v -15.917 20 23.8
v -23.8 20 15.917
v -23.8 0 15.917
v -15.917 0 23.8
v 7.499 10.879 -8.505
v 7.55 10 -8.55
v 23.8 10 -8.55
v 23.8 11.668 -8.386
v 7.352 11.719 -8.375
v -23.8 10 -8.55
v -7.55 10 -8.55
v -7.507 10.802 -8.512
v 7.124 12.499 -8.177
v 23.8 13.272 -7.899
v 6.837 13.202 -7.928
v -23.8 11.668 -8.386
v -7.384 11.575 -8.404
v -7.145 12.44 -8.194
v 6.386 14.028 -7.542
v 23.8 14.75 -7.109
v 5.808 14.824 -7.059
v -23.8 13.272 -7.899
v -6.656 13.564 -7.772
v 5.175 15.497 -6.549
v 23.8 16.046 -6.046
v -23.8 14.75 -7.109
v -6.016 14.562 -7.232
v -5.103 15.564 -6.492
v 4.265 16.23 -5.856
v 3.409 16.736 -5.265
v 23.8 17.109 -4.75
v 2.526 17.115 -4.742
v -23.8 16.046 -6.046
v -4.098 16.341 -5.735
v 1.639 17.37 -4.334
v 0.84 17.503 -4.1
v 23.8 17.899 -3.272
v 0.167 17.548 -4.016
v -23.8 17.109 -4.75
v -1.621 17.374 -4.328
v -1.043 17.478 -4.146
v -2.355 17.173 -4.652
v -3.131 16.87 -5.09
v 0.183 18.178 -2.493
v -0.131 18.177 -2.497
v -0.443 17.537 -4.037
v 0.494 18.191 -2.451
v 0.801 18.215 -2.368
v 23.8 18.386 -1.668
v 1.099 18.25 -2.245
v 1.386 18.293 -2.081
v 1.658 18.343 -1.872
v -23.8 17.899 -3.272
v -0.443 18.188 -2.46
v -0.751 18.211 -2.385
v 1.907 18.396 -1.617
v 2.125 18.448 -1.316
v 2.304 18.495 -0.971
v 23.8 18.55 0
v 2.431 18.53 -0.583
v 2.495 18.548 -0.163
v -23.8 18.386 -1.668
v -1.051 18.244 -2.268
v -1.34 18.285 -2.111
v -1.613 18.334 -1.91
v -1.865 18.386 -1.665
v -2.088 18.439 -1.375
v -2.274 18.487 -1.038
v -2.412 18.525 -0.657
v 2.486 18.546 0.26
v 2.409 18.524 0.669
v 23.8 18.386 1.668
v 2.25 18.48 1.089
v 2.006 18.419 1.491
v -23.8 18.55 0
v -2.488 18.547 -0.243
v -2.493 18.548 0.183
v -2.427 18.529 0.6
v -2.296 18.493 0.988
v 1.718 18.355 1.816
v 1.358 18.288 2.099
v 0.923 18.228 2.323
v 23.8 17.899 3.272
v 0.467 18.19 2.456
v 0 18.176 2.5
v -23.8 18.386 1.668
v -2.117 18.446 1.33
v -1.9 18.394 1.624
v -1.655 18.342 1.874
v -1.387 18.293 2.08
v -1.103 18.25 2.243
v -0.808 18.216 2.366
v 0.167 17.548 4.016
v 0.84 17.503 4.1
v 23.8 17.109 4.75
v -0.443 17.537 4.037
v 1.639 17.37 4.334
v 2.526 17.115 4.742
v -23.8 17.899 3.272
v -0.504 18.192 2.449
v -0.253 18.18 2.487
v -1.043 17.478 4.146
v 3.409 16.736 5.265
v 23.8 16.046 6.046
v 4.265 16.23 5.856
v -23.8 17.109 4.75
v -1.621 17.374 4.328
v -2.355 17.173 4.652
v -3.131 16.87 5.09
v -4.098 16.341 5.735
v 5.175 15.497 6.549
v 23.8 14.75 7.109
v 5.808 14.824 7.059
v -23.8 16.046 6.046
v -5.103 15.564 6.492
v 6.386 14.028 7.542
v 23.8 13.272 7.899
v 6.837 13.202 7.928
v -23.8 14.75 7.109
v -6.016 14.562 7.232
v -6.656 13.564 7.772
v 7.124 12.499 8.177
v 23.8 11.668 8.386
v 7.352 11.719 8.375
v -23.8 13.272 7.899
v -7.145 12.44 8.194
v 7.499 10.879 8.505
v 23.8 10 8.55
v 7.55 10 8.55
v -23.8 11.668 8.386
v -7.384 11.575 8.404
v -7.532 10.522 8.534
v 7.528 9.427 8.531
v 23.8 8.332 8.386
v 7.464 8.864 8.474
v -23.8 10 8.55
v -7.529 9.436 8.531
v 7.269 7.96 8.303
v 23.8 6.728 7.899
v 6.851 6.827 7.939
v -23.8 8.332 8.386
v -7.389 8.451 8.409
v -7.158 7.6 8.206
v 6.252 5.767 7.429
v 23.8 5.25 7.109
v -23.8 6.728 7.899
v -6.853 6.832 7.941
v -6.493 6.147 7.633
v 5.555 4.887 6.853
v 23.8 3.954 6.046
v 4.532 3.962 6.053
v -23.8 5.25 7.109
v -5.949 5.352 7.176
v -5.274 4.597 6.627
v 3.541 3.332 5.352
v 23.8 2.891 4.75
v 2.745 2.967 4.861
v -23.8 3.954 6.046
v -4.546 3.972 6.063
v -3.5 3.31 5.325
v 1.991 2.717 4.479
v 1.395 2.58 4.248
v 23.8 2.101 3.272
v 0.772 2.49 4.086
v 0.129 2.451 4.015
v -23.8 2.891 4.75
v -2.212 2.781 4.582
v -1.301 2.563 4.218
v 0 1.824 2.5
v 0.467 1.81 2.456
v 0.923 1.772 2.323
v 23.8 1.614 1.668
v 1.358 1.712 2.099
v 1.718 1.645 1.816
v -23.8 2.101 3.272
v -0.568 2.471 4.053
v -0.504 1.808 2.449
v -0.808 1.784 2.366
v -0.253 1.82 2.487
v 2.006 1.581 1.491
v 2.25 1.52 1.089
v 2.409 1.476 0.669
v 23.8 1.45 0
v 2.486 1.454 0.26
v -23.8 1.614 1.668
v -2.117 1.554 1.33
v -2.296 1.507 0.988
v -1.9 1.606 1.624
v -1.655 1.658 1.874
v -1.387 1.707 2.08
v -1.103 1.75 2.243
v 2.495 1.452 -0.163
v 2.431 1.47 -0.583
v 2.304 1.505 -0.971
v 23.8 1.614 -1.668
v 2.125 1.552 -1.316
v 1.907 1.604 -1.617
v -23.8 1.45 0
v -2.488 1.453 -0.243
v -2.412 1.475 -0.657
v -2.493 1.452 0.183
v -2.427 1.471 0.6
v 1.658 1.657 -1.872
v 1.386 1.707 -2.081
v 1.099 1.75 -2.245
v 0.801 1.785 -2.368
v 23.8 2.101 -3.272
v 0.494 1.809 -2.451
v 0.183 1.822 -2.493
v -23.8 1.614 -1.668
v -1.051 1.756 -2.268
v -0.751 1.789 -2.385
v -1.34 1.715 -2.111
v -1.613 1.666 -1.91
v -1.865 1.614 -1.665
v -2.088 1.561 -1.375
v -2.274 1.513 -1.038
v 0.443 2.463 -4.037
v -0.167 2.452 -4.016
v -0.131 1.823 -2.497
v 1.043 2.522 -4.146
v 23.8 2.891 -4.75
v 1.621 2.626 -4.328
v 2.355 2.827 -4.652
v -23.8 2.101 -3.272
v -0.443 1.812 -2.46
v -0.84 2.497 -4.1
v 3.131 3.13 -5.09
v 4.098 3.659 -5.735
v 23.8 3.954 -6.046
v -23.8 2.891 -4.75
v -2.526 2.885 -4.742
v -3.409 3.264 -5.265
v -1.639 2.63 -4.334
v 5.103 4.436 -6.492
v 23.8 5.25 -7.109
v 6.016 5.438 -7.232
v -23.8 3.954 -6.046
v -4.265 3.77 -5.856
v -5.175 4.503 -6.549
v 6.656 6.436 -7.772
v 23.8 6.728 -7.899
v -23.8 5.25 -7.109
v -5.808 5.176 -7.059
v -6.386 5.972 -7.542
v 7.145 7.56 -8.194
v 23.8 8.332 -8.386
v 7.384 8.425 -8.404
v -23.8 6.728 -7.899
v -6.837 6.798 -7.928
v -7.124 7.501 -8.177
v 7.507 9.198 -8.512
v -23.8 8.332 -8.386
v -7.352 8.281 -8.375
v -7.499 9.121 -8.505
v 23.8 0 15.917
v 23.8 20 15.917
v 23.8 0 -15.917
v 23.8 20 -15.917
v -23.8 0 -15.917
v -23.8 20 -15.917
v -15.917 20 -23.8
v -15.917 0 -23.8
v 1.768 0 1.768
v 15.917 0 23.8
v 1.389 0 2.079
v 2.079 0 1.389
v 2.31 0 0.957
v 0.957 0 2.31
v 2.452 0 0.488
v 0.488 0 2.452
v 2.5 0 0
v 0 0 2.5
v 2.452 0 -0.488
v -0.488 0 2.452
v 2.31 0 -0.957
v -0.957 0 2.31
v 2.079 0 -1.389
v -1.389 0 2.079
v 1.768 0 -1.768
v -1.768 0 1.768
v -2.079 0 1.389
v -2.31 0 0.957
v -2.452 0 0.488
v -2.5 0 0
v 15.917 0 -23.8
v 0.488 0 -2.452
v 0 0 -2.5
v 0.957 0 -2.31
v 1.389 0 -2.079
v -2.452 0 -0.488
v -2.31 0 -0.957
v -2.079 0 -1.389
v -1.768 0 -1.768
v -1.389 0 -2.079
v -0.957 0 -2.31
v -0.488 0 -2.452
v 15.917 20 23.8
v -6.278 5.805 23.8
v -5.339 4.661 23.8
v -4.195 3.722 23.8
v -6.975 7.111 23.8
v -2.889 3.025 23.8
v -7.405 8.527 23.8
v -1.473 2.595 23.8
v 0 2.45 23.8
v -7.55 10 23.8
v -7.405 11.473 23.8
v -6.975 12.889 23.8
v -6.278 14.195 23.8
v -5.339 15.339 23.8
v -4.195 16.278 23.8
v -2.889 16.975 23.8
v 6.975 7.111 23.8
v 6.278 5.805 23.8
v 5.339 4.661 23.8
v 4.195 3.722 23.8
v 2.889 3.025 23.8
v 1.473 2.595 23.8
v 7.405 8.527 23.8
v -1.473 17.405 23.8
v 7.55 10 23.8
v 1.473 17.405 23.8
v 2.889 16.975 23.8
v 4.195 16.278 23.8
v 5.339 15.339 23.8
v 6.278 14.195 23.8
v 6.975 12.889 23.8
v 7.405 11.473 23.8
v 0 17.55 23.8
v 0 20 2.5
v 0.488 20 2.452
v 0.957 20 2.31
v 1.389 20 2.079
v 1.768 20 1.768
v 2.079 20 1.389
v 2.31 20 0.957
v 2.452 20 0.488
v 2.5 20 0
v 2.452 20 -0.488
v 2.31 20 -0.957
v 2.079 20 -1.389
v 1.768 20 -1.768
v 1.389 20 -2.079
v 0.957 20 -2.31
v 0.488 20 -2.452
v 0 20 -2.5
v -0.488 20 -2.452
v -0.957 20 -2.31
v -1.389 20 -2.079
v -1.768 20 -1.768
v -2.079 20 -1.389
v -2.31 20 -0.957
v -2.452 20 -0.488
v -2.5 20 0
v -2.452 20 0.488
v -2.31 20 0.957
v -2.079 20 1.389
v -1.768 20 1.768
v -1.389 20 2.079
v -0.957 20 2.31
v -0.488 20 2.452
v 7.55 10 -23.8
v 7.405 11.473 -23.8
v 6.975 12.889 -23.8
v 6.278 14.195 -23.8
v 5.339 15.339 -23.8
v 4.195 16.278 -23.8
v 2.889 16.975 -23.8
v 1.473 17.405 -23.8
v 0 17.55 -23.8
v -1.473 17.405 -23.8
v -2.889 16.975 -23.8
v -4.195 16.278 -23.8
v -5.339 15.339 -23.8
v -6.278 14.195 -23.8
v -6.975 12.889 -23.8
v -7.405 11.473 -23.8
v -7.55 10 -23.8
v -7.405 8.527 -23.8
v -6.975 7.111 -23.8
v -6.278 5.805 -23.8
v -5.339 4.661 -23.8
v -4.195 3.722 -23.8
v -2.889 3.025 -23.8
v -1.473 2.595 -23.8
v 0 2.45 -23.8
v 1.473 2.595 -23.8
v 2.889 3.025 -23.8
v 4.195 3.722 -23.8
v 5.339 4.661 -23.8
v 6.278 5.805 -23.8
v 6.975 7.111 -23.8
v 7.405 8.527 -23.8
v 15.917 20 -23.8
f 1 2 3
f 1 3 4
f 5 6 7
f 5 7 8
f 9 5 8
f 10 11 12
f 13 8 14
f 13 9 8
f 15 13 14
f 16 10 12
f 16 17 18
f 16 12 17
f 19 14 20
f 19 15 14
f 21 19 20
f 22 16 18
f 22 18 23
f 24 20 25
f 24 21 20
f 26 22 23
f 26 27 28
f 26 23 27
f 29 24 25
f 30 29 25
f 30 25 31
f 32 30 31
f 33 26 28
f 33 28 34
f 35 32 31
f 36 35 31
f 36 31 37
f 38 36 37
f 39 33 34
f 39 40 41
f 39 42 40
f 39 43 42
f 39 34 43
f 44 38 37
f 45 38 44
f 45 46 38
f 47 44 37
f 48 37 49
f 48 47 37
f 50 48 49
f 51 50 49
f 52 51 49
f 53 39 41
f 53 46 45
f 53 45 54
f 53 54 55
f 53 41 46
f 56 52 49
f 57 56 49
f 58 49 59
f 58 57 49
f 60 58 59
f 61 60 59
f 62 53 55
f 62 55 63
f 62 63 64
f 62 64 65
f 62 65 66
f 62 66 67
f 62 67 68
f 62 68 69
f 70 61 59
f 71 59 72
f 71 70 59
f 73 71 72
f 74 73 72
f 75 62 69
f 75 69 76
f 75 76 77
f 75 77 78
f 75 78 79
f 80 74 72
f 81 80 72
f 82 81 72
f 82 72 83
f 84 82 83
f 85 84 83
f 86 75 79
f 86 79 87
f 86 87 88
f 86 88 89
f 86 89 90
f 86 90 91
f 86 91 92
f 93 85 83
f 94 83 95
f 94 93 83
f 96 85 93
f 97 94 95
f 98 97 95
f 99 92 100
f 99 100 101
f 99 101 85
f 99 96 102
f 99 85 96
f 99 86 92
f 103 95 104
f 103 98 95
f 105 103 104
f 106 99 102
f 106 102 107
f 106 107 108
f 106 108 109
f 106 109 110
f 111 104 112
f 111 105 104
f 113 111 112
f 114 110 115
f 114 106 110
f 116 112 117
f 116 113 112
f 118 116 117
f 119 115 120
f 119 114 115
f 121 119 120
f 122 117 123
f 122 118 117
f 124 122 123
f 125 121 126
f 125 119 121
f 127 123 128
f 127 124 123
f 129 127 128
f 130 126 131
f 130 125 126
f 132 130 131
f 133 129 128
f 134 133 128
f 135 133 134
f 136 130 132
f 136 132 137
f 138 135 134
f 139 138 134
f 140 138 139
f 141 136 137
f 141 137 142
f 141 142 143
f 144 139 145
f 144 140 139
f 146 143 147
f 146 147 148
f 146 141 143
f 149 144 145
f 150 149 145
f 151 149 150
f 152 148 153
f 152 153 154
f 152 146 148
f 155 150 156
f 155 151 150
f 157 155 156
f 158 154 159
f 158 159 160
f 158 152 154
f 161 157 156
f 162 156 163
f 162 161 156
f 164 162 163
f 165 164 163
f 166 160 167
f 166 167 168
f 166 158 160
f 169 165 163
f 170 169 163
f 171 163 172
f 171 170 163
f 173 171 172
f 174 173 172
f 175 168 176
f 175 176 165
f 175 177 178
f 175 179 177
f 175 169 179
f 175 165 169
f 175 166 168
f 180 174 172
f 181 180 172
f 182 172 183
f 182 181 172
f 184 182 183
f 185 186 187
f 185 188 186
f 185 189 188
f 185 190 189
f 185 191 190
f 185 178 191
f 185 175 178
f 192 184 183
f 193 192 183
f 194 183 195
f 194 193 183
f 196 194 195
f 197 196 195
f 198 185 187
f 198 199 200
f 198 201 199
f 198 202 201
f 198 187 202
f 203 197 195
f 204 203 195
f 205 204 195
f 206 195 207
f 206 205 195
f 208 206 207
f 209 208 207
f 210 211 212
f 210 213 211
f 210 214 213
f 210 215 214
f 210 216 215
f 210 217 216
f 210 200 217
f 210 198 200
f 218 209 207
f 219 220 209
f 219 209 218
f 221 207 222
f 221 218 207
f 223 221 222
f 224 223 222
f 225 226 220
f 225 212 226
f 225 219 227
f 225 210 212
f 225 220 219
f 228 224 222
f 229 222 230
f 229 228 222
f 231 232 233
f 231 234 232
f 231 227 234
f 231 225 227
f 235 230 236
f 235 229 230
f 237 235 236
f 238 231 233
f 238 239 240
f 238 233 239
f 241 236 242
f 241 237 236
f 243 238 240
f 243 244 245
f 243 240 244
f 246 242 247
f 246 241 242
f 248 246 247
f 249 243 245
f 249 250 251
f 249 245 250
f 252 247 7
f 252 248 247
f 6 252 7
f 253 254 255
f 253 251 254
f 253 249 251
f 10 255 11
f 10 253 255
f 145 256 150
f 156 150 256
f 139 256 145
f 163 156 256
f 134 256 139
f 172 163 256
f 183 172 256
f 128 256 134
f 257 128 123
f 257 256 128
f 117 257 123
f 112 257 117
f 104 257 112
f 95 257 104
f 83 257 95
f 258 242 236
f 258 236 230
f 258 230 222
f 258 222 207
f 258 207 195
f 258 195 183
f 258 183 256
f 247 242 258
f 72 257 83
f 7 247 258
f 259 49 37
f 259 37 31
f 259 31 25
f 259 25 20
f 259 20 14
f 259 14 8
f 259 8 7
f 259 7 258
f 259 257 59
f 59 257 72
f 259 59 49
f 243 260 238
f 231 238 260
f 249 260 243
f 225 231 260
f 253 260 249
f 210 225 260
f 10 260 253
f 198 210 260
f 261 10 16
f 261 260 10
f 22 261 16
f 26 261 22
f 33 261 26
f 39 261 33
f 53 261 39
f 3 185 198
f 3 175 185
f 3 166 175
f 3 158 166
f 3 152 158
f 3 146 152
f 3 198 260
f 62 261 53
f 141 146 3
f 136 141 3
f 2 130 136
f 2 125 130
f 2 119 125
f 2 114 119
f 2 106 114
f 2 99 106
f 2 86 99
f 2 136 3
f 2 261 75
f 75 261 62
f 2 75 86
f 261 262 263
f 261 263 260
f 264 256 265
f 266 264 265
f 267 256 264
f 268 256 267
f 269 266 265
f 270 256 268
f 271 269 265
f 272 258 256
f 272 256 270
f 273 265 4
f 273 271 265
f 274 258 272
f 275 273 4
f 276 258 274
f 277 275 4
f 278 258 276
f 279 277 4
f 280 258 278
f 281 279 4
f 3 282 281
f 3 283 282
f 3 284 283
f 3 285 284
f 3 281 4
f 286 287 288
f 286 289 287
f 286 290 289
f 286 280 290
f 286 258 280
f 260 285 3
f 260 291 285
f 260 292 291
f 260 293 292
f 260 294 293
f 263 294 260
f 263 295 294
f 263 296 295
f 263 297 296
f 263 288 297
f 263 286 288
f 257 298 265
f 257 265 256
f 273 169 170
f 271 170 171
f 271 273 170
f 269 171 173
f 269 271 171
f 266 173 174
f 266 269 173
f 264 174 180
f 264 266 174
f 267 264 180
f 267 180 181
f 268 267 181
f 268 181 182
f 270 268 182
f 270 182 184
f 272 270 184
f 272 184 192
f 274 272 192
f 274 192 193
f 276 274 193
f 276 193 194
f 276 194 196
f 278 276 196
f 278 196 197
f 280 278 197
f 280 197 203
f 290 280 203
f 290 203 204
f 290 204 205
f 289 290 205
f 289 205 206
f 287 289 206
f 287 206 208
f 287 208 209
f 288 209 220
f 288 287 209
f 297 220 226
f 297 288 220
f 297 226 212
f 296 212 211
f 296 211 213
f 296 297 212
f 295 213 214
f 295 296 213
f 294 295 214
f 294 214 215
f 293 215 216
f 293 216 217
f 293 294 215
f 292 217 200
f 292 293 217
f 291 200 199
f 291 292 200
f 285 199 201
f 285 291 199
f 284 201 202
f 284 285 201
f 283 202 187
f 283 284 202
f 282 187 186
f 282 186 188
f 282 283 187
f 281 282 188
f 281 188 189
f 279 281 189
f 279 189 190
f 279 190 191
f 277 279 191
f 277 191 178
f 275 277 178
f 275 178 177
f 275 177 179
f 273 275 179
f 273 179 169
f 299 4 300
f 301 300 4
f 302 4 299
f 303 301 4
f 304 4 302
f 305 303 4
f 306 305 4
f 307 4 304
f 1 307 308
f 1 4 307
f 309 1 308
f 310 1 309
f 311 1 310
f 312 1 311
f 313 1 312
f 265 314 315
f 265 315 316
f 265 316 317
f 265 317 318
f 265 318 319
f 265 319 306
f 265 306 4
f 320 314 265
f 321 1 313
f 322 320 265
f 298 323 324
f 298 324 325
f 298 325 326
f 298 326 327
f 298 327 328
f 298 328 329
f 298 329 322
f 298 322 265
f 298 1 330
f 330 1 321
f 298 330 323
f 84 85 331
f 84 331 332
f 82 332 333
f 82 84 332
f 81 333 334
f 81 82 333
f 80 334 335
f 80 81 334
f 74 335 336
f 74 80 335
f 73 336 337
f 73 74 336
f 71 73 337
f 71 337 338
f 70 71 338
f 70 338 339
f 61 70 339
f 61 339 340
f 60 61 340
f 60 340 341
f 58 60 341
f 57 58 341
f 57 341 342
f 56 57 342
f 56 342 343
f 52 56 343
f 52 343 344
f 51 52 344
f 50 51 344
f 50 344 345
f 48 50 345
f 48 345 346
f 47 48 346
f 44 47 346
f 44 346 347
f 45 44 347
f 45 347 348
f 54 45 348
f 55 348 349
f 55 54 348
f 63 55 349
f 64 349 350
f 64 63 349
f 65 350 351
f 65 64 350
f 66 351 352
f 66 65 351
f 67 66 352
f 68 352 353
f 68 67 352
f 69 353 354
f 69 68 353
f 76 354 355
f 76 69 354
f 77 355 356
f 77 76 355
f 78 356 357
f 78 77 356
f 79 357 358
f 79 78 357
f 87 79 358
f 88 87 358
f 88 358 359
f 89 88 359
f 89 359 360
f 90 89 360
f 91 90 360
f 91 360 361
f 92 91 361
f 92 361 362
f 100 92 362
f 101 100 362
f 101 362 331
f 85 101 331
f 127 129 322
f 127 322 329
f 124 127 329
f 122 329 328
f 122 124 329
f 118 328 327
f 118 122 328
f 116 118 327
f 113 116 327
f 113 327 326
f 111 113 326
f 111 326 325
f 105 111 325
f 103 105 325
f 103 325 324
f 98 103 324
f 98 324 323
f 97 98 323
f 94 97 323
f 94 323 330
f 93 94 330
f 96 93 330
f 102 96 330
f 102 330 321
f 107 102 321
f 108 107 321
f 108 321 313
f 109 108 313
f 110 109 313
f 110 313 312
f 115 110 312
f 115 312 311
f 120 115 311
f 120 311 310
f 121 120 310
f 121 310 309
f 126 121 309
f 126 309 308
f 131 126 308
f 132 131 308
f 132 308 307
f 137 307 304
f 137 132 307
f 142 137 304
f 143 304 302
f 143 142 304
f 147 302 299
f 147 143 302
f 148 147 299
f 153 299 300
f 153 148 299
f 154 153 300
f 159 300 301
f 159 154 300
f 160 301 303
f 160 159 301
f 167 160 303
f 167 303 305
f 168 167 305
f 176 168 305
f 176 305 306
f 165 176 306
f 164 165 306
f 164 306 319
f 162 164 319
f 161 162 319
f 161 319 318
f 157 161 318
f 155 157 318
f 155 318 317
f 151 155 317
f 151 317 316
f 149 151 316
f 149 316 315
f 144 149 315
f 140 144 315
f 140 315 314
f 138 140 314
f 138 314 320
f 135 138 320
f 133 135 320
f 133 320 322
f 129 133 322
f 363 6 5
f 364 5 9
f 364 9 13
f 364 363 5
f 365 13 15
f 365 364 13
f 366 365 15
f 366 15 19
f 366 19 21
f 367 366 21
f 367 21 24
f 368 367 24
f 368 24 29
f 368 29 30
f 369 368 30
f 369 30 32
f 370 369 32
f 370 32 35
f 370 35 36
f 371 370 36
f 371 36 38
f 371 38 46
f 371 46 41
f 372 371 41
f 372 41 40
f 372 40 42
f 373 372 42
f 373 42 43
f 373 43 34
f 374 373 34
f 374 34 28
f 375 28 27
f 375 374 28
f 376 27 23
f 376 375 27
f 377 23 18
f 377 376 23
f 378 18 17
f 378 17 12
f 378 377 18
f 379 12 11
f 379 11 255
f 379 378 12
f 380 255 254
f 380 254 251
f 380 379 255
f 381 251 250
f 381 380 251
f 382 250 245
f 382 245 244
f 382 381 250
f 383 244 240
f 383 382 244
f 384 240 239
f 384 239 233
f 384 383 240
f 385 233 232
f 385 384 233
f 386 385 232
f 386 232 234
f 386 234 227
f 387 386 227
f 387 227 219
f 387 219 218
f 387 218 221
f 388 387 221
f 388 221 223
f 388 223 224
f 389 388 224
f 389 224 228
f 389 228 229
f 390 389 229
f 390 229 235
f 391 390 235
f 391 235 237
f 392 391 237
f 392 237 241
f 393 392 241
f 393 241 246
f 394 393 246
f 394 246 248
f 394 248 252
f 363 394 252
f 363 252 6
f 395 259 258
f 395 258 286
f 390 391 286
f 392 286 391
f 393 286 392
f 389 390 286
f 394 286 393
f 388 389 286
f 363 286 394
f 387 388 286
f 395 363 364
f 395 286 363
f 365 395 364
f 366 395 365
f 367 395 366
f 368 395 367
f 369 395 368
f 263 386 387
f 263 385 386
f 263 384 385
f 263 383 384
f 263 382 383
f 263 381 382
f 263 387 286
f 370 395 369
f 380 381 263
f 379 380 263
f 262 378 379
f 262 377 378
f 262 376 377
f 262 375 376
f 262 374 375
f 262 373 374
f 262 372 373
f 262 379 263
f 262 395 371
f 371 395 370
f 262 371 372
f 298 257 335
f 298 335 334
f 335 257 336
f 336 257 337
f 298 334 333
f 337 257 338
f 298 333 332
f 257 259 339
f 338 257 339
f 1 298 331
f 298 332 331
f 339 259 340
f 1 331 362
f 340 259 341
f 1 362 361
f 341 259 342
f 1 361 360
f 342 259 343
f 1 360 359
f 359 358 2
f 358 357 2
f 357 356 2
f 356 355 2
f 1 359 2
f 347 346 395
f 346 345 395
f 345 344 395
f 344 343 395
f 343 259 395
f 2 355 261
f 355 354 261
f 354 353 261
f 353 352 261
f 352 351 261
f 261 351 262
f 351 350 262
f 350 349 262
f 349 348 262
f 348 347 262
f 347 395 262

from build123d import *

# Parameters (mm, degrees)
BOSS_EXTRUDE1_DEPTH     = 20
CUT_EXTRUDE1_DEPTH      = 58.271284253
CUT_EXTRUDE1_DEPTH_BACK = 58.271284253
SKETCH2_R               = 7.55
CUT_EXTRUDE2_DEPTH      = 58.271284253
CUT_EXTRUDE2_DEPTH_BACK = 58.271284253
SKETCH3_R               = 8.55
CUT_EXTRUDE3_DEPTH      = 40.395431329
CUT_EXTRUDE3_DEPTH_BACK = 40.395431329
SKETCH4_R               = 2.5
CUT_EXTRUDE4_DEPTH      = 40.39543138


with BuildPart() as part:
    # Sketch1 → Boss-Extrude1 (new body)
    with BuildSketch(Plane(origin=(0, 0, 0), x_dir=(1, 0, 0), z_dir=(0, 1, 0))):
        Polygon((-24, 16), (-16, 24), (16, 24), (24, 16), (24, -16), (16, -24), (-16, -24), (-24, -16), align=None)
    extrude(amount=BOSS_EXTRUDE1_DEPTH)

    # Sketch2 → Cut-Extrude1 (cut, two sides: drawn at the far end of the back side and taken through both)
    with BuildSketch(Plane.XY.offset(24).offset(-CUT_EXTRUDE1_DEPTH_BACK)):
        with Locations((0, 10)):
            Circle(SKETCH2_R)
    extrude(amount=CUT_EXTRUDE1_DEPTH + CUT_EXTRUDE1_DEPTH_BACK, mode=Mode.SUBTRACT)

    # Sketch3 → Cut-Extrude2 (cut, two sides: drawn at the far end of the back side and taken through both)
    with BuildSketch(Plane(origin=(24, 0, 0), x_dir=(0, 0, -1), z_dir=(1, 0, 0)).offset(-CUT_EXTRUDE2_DEPTH_BACK)):
        with Locations((0, 10)):
            Circle(SKETCH3_R)
    extrude(amount=CUT_EXTRUDE2_DEPTH + CUT_EXTRUDE2_DEPTH_BACK, mode=Mode.SUBTRACT)

    # Sketch4 → Cut-Extrude3 (cut, two sides: drawn at the far end of the back side and taken through both)
    with BuildSketch(Plane(origin=(0, 20, 0), x_dir=(1, 0, 0), z_dir=(0, 1, 0)).offset(-CUT_EXTRUDE3_DEPTH_BACK)):
        with Locations(Location((0, 0, 0), (0, 0, 270))):
            Circle(SKETCH4_R)
    extrude(amount=CUT_EXTRUDE3_DEPTH + CUT_EXTRUDE3_DEPTH_BACK, mode=Mode.SUBTRACT)

    # Sketch5 → Cut-Extrude4 (cut, through all)
    with BuildSketch(Plane(origin=(0, 20, 0), x_dir=(1, 0, 0), z_dir=(0, 1, 0))):
        Polygon((-24, 16), (-24, -16), (-16, -24), (16, -24), (24, -16), (24, 16), (16, 24), (-16, 24), align=None)
        Polygon((-23.8, 15.917157288), (-23.8, -15.917157288), (-15.917157288, -23.8), (15.917157288, -23.8), (23.8, -15.917157288), (23.8, 15.917157288), (15.917157288, 23.8), (-15.917157288, 23.8), align=None, mode=Mode.SUBTRACT)
    extrude(amount=-CUT_EXTRUDE4_DEPTH, mode=Mode.SUBTRACT)


solid = part.part
